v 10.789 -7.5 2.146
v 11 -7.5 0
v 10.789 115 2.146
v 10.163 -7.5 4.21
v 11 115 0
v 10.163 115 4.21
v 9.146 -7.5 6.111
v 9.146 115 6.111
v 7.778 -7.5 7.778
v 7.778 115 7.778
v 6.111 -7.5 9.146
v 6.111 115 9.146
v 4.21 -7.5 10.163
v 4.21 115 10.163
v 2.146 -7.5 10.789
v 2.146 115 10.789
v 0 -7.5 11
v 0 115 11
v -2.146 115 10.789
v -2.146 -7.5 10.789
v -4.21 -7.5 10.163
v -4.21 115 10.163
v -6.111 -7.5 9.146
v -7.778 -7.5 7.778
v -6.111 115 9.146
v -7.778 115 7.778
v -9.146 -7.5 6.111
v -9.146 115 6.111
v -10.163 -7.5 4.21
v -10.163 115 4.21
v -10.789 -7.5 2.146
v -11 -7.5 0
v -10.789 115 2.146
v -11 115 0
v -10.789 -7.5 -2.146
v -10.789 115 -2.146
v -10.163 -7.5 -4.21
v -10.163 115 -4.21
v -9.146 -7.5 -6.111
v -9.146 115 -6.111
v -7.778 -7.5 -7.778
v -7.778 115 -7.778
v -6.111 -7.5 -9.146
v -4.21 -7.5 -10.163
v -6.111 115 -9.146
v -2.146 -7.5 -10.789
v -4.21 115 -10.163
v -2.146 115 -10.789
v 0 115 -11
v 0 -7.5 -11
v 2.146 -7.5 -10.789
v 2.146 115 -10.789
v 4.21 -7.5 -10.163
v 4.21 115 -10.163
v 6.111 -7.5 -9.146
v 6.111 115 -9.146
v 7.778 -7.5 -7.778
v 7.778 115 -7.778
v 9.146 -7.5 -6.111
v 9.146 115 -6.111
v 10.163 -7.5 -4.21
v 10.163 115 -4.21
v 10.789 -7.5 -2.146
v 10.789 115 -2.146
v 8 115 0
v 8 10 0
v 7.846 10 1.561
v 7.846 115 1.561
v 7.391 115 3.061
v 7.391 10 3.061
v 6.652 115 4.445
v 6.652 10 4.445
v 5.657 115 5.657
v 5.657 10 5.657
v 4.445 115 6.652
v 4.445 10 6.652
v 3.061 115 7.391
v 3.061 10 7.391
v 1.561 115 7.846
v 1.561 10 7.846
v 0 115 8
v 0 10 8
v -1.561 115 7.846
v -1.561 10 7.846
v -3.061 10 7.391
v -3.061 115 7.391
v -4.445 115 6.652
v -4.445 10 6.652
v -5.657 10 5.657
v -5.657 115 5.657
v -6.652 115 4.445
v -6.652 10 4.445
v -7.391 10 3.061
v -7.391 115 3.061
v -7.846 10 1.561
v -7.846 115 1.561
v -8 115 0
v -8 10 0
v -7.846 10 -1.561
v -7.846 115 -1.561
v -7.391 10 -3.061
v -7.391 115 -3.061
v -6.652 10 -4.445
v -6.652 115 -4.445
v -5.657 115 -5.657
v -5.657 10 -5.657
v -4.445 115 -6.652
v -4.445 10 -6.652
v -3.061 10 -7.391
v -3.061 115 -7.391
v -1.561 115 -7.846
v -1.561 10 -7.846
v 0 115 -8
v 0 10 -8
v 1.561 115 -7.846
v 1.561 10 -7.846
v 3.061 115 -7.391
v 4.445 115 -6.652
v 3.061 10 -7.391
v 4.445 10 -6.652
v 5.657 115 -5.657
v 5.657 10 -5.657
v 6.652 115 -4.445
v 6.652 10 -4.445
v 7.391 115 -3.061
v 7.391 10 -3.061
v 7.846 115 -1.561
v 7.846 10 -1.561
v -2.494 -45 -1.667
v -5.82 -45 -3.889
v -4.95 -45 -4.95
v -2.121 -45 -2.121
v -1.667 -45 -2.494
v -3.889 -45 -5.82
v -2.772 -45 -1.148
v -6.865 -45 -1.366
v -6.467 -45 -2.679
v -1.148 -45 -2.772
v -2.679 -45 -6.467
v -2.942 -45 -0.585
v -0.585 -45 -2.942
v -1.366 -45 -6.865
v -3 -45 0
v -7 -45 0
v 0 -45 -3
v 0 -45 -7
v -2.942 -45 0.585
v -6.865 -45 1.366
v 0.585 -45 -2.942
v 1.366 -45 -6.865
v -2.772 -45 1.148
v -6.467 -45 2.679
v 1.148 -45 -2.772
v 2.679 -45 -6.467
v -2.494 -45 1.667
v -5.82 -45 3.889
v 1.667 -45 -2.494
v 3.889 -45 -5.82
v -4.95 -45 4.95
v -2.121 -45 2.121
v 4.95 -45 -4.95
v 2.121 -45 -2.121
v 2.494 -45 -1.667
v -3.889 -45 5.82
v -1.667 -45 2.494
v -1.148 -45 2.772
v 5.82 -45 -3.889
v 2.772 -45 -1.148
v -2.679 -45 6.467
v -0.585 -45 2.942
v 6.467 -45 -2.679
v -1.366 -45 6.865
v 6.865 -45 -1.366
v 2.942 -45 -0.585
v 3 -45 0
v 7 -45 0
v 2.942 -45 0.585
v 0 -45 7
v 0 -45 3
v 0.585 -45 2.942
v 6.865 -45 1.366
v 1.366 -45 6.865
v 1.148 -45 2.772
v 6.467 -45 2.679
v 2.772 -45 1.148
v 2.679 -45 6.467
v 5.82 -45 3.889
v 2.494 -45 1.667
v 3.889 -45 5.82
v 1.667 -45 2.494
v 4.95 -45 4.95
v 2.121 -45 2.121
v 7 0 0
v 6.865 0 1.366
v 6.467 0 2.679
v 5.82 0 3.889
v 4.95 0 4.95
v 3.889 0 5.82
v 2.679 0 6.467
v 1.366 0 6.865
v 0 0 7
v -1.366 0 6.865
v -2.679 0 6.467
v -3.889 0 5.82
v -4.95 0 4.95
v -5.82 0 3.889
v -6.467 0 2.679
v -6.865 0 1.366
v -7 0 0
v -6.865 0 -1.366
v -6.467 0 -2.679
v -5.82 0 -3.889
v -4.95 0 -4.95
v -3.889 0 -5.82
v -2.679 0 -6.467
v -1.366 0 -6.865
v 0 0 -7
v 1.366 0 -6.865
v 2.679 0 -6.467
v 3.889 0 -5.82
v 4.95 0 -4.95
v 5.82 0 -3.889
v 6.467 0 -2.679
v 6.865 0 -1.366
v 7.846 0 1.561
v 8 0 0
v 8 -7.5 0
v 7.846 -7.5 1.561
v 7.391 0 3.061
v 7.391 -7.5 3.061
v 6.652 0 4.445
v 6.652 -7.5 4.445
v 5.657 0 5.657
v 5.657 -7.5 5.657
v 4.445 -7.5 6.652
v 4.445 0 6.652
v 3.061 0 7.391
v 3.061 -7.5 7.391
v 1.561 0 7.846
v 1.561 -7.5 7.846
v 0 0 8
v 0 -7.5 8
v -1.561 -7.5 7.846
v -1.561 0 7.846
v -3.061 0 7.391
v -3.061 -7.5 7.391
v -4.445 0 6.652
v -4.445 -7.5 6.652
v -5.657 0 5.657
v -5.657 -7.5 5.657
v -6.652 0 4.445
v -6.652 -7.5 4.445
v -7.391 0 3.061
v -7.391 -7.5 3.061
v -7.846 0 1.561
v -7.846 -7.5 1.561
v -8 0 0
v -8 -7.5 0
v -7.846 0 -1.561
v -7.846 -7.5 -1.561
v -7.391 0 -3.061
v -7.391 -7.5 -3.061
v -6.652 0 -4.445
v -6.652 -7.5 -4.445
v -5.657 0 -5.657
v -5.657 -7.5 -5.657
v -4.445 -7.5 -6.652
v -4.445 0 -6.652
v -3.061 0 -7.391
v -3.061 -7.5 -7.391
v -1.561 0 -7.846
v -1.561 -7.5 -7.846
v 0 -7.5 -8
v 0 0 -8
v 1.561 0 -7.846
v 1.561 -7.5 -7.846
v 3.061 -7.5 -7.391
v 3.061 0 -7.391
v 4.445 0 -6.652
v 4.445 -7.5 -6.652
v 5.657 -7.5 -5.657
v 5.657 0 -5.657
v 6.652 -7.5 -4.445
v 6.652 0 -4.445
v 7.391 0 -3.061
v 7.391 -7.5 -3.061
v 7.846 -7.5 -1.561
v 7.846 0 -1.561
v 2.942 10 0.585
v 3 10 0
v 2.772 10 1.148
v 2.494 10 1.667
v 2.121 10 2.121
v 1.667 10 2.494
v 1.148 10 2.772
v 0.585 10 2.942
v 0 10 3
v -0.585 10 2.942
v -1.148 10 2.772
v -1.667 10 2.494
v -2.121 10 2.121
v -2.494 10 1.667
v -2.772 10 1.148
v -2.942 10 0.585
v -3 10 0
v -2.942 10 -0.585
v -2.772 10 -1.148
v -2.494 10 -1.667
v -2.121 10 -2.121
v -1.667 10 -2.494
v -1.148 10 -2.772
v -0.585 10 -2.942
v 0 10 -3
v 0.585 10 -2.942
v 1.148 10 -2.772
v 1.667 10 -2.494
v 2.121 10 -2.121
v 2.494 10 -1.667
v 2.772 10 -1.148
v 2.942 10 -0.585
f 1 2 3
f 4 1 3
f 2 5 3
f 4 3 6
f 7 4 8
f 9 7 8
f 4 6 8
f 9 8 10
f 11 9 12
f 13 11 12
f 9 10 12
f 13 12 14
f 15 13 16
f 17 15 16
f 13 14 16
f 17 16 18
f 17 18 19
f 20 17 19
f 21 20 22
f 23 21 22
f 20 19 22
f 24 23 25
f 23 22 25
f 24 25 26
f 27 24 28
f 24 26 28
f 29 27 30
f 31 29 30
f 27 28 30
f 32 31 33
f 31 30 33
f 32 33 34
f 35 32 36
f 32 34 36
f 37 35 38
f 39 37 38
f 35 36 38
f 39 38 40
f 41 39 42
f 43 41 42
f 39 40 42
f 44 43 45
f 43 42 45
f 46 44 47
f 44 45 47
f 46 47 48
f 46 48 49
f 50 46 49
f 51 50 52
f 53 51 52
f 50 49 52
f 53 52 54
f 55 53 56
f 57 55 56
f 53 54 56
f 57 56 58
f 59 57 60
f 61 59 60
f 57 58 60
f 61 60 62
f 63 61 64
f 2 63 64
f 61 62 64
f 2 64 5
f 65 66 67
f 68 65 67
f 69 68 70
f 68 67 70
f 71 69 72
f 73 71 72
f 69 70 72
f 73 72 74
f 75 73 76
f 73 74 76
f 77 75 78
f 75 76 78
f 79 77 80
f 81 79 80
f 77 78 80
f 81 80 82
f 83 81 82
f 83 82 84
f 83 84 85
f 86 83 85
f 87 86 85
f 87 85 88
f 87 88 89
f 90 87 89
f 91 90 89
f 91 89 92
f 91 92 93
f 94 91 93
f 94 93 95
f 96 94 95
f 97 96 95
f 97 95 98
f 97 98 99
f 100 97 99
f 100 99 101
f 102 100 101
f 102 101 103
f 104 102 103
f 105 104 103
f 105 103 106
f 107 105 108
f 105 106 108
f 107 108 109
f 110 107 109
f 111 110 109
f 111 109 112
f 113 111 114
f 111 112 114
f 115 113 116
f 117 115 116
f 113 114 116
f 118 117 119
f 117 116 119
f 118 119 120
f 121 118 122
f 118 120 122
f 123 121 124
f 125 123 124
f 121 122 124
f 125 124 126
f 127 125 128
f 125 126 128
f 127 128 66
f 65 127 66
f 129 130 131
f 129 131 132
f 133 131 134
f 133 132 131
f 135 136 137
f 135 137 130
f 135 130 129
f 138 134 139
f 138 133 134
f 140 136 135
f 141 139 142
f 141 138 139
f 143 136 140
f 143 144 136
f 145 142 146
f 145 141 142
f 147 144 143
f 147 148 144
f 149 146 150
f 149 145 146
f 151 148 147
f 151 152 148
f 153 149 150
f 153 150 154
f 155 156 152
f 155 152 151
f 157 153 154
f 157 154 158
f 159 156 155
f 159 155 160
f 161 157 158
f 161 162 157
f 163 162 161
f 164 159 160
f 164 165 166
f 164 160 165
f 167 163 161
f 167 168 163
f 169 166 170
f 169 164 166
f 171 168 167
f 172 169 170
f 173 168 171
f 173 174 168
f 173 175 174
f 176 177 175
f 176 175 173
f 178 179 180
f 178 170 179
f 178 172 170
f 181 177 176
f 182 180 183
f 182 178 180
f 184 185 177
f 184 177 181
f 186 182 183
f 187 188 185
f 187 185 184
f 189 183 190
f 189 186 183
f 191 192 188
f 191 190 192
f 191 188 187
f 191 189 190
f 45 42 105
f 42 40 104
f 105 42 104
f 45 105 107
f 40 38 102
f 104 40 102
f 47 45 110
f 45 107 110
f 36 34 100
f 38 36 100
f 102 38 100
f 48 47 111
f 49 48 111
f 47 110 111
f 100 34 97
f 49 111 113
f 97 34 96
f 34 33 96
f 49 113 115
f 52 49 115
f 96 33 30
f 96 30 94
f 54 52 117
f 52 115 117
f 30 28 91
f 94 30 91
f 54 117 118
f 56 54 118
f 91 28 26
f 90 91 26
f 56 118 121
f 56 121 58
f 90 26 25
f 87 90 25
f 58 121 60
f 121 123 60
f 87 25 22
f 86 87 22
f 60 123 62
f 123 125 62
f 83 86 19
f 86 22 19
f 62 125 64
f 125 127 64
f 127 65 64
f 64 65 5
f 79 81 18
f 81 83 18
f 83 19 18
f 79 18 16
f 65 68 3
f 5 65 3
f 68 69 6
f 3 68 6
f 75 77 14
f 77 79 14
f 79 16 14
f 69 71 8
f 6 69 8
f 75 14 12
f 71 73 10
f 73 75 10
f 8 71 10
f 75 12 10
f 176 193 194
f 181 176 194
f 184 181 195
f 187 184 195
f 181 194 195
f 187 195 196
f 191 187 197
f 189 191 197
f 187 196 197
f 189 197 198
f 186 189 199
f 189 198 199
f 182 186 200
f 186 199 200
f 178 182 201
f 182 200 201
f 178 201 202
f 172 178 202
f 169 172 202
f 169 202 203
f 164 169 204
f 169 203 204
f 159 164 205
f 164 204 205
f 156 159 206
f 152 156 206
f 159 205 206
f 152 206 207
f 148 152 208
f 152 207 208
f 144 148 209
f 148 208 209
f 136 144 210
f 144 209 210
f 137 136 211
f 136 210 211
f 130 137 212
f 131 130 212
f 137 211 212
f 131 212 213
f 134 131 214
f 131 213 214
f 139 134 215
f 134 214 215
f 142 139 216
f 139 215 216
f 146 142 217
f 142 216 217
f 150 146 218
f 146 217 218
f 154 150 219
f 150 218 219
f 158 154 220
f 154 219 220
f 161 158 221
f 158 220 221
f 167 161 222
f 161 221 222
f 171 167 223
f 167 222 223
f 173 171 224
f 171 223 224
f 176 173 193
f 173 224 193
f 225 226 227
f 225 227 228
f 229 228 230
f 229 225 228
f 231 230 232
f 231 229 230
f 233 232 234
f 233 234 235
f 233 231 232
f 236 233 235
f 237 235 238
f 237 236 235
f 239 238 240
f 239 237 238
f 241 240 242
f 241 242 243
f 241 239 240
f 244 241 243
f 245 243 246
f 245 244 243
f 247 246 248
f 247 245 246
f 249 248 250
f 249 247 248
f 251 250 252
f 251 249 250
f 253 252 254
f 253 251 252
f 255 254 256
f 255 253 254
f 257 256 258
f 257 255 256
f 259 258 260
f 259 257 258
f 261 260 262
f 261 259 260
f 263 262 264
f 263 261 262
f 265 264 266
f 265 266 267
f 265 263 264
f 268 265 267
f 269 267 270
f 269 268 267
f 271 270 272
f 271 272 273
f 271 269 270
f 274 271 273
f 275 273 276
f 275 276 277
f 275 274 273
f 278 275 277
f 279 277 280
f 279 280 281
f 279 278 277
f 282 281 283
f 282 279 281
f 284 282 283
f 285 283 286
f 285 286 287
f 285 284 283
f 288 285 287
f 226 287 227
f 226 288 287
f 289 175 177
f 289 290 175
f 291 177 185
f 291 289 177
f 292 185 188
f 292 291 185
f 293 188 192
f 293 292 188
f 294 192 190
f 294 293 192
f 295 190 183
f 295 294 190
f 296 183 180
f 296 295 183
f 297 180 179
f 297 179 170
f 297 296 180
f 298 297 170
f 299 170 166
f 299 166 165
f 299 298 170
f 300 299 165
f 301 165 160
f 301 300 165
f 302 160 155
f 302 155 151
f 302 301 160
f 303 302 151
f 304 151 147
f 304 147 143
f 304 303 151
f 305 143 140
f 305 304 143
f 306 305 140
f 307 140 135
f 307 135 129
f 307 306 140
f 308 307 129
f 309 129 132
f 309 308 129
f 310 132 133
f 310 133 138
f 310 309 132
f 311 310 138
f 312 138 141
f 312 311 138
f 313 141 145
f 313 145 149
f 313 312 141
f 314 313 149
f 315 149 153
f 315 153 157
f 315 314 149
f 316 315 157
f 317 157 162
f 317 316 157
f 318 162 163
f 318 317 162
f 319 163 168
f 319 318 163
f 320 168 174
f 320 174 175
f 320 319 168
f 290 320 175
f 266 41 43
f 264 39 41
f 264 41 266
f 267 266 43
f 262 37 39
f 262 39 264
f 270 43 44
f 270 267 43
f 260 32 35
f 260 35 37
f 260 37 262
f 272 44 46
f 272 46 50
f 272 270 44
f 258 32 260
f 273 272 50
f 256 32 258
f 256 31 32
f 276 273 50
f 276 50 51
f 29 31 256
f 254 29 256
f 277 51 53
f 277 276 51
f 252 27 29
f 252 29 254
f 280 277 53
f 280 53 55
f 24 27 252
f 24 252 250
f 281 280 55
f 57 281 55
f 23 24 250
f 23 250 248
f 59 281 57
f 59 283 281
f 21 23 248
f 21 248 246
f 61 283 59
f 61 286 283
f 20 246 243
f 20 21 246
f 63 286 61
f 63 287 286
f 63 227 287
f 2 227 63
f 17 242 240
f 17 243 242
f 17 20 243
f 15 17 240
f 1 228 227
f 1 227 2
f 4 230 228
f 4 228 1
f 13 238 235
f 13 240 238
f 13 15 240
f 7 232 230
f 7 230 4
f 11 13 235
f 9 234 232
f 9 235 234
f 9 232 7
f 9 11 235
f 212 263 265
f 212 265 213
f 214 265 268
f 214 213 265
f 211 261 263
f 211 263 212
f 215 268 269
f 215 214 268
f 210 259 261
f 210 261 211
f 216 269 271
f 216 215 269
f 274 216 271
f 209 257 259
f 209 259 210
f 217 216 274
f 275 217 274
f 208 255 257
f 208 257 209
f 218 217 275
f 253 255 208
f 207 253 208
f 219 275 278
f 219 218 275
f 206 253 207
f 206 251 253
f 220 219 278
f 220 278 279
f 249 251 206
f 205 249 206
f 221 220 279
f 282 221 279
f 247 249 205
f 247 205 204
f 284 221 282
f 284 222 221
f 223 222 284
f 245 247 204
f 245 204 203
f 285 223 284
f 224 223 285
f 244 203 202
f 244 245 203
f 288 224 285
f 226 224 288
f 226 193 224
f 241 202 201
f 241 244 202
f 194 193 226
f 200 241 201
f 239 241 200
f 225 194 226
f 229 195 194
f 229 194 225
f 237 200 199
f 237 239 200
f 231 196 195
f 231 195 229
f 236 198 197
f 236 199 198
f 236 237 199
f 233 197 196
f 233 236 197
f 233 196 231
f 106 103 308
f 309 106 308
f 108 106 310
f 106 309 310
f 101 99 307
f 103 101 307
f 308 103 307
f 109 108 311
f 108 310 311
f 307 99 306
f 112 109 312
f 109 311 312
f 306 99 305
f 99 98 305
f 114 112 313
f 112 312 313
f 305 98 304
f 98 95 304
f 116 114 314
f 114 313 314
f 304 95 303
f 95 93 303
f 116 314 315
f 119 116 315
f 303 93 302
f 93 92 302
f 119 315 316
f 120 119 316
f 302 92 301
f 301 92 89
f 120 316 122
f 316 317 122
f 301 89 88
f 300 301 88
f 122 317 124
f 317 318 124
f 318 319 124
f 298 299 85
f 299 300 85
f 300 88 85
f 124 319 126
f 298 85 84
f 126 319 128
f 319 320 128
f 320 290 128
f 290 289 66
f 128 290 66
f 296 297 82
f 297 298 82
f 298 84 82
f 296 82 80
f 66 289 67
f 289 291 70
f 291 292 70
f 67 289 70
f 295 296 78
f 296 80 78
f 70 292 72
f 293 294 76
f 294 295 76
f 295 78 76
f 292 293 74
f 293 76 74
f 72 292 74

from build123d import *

# Parameters (mm, degrees)
SKETCH053_R    = 11
SKETCH053_R_2  = 8
PAD_DEPTH      = 115
PAD_DEPTH_BACK = 7.5
SKETCH054_R    = 11
SKETCH054_R_2  = 3
PAD025_DEPTH   = 10
SKETCH055_R    = 7
SKETCH055_R_2  = 3
PAD026_DEPTH   = 45


with BuildPart() as part:
    # Sketch053 → Pad (new body, two sides)
    with BuildSketch(Plane.XZ) as pad_sk:
        Circle(SKETCH053_R)
        Circle(SKETCH053_R_2, mode=Mode.SUBTRACT)
    extrude(amount=-PAD_DEPTH)
    extrude(pad_sk.sketch, amount=PAD_DEPTH_BACK)

    # Sketch054 → Pad025 (join)
    with BuildSketch(Plane.XZ):
        Circle(SKETCH054_R)
        Circle(SKETCH054_R_2, mode=Mode.SUBTRACT)
    extrude(amount=-PAD025_DEPTH)

    # Sketch055 → Pad026 (join)
    with BuildSketch(Plane.XZ):
        Circle(SKETCH055_R)
        Circle(SKETCH055_R_2, mode=Mode.SUBTRACT)
    extrude(amount=PAD026_DEPTH)


solid = part.part
